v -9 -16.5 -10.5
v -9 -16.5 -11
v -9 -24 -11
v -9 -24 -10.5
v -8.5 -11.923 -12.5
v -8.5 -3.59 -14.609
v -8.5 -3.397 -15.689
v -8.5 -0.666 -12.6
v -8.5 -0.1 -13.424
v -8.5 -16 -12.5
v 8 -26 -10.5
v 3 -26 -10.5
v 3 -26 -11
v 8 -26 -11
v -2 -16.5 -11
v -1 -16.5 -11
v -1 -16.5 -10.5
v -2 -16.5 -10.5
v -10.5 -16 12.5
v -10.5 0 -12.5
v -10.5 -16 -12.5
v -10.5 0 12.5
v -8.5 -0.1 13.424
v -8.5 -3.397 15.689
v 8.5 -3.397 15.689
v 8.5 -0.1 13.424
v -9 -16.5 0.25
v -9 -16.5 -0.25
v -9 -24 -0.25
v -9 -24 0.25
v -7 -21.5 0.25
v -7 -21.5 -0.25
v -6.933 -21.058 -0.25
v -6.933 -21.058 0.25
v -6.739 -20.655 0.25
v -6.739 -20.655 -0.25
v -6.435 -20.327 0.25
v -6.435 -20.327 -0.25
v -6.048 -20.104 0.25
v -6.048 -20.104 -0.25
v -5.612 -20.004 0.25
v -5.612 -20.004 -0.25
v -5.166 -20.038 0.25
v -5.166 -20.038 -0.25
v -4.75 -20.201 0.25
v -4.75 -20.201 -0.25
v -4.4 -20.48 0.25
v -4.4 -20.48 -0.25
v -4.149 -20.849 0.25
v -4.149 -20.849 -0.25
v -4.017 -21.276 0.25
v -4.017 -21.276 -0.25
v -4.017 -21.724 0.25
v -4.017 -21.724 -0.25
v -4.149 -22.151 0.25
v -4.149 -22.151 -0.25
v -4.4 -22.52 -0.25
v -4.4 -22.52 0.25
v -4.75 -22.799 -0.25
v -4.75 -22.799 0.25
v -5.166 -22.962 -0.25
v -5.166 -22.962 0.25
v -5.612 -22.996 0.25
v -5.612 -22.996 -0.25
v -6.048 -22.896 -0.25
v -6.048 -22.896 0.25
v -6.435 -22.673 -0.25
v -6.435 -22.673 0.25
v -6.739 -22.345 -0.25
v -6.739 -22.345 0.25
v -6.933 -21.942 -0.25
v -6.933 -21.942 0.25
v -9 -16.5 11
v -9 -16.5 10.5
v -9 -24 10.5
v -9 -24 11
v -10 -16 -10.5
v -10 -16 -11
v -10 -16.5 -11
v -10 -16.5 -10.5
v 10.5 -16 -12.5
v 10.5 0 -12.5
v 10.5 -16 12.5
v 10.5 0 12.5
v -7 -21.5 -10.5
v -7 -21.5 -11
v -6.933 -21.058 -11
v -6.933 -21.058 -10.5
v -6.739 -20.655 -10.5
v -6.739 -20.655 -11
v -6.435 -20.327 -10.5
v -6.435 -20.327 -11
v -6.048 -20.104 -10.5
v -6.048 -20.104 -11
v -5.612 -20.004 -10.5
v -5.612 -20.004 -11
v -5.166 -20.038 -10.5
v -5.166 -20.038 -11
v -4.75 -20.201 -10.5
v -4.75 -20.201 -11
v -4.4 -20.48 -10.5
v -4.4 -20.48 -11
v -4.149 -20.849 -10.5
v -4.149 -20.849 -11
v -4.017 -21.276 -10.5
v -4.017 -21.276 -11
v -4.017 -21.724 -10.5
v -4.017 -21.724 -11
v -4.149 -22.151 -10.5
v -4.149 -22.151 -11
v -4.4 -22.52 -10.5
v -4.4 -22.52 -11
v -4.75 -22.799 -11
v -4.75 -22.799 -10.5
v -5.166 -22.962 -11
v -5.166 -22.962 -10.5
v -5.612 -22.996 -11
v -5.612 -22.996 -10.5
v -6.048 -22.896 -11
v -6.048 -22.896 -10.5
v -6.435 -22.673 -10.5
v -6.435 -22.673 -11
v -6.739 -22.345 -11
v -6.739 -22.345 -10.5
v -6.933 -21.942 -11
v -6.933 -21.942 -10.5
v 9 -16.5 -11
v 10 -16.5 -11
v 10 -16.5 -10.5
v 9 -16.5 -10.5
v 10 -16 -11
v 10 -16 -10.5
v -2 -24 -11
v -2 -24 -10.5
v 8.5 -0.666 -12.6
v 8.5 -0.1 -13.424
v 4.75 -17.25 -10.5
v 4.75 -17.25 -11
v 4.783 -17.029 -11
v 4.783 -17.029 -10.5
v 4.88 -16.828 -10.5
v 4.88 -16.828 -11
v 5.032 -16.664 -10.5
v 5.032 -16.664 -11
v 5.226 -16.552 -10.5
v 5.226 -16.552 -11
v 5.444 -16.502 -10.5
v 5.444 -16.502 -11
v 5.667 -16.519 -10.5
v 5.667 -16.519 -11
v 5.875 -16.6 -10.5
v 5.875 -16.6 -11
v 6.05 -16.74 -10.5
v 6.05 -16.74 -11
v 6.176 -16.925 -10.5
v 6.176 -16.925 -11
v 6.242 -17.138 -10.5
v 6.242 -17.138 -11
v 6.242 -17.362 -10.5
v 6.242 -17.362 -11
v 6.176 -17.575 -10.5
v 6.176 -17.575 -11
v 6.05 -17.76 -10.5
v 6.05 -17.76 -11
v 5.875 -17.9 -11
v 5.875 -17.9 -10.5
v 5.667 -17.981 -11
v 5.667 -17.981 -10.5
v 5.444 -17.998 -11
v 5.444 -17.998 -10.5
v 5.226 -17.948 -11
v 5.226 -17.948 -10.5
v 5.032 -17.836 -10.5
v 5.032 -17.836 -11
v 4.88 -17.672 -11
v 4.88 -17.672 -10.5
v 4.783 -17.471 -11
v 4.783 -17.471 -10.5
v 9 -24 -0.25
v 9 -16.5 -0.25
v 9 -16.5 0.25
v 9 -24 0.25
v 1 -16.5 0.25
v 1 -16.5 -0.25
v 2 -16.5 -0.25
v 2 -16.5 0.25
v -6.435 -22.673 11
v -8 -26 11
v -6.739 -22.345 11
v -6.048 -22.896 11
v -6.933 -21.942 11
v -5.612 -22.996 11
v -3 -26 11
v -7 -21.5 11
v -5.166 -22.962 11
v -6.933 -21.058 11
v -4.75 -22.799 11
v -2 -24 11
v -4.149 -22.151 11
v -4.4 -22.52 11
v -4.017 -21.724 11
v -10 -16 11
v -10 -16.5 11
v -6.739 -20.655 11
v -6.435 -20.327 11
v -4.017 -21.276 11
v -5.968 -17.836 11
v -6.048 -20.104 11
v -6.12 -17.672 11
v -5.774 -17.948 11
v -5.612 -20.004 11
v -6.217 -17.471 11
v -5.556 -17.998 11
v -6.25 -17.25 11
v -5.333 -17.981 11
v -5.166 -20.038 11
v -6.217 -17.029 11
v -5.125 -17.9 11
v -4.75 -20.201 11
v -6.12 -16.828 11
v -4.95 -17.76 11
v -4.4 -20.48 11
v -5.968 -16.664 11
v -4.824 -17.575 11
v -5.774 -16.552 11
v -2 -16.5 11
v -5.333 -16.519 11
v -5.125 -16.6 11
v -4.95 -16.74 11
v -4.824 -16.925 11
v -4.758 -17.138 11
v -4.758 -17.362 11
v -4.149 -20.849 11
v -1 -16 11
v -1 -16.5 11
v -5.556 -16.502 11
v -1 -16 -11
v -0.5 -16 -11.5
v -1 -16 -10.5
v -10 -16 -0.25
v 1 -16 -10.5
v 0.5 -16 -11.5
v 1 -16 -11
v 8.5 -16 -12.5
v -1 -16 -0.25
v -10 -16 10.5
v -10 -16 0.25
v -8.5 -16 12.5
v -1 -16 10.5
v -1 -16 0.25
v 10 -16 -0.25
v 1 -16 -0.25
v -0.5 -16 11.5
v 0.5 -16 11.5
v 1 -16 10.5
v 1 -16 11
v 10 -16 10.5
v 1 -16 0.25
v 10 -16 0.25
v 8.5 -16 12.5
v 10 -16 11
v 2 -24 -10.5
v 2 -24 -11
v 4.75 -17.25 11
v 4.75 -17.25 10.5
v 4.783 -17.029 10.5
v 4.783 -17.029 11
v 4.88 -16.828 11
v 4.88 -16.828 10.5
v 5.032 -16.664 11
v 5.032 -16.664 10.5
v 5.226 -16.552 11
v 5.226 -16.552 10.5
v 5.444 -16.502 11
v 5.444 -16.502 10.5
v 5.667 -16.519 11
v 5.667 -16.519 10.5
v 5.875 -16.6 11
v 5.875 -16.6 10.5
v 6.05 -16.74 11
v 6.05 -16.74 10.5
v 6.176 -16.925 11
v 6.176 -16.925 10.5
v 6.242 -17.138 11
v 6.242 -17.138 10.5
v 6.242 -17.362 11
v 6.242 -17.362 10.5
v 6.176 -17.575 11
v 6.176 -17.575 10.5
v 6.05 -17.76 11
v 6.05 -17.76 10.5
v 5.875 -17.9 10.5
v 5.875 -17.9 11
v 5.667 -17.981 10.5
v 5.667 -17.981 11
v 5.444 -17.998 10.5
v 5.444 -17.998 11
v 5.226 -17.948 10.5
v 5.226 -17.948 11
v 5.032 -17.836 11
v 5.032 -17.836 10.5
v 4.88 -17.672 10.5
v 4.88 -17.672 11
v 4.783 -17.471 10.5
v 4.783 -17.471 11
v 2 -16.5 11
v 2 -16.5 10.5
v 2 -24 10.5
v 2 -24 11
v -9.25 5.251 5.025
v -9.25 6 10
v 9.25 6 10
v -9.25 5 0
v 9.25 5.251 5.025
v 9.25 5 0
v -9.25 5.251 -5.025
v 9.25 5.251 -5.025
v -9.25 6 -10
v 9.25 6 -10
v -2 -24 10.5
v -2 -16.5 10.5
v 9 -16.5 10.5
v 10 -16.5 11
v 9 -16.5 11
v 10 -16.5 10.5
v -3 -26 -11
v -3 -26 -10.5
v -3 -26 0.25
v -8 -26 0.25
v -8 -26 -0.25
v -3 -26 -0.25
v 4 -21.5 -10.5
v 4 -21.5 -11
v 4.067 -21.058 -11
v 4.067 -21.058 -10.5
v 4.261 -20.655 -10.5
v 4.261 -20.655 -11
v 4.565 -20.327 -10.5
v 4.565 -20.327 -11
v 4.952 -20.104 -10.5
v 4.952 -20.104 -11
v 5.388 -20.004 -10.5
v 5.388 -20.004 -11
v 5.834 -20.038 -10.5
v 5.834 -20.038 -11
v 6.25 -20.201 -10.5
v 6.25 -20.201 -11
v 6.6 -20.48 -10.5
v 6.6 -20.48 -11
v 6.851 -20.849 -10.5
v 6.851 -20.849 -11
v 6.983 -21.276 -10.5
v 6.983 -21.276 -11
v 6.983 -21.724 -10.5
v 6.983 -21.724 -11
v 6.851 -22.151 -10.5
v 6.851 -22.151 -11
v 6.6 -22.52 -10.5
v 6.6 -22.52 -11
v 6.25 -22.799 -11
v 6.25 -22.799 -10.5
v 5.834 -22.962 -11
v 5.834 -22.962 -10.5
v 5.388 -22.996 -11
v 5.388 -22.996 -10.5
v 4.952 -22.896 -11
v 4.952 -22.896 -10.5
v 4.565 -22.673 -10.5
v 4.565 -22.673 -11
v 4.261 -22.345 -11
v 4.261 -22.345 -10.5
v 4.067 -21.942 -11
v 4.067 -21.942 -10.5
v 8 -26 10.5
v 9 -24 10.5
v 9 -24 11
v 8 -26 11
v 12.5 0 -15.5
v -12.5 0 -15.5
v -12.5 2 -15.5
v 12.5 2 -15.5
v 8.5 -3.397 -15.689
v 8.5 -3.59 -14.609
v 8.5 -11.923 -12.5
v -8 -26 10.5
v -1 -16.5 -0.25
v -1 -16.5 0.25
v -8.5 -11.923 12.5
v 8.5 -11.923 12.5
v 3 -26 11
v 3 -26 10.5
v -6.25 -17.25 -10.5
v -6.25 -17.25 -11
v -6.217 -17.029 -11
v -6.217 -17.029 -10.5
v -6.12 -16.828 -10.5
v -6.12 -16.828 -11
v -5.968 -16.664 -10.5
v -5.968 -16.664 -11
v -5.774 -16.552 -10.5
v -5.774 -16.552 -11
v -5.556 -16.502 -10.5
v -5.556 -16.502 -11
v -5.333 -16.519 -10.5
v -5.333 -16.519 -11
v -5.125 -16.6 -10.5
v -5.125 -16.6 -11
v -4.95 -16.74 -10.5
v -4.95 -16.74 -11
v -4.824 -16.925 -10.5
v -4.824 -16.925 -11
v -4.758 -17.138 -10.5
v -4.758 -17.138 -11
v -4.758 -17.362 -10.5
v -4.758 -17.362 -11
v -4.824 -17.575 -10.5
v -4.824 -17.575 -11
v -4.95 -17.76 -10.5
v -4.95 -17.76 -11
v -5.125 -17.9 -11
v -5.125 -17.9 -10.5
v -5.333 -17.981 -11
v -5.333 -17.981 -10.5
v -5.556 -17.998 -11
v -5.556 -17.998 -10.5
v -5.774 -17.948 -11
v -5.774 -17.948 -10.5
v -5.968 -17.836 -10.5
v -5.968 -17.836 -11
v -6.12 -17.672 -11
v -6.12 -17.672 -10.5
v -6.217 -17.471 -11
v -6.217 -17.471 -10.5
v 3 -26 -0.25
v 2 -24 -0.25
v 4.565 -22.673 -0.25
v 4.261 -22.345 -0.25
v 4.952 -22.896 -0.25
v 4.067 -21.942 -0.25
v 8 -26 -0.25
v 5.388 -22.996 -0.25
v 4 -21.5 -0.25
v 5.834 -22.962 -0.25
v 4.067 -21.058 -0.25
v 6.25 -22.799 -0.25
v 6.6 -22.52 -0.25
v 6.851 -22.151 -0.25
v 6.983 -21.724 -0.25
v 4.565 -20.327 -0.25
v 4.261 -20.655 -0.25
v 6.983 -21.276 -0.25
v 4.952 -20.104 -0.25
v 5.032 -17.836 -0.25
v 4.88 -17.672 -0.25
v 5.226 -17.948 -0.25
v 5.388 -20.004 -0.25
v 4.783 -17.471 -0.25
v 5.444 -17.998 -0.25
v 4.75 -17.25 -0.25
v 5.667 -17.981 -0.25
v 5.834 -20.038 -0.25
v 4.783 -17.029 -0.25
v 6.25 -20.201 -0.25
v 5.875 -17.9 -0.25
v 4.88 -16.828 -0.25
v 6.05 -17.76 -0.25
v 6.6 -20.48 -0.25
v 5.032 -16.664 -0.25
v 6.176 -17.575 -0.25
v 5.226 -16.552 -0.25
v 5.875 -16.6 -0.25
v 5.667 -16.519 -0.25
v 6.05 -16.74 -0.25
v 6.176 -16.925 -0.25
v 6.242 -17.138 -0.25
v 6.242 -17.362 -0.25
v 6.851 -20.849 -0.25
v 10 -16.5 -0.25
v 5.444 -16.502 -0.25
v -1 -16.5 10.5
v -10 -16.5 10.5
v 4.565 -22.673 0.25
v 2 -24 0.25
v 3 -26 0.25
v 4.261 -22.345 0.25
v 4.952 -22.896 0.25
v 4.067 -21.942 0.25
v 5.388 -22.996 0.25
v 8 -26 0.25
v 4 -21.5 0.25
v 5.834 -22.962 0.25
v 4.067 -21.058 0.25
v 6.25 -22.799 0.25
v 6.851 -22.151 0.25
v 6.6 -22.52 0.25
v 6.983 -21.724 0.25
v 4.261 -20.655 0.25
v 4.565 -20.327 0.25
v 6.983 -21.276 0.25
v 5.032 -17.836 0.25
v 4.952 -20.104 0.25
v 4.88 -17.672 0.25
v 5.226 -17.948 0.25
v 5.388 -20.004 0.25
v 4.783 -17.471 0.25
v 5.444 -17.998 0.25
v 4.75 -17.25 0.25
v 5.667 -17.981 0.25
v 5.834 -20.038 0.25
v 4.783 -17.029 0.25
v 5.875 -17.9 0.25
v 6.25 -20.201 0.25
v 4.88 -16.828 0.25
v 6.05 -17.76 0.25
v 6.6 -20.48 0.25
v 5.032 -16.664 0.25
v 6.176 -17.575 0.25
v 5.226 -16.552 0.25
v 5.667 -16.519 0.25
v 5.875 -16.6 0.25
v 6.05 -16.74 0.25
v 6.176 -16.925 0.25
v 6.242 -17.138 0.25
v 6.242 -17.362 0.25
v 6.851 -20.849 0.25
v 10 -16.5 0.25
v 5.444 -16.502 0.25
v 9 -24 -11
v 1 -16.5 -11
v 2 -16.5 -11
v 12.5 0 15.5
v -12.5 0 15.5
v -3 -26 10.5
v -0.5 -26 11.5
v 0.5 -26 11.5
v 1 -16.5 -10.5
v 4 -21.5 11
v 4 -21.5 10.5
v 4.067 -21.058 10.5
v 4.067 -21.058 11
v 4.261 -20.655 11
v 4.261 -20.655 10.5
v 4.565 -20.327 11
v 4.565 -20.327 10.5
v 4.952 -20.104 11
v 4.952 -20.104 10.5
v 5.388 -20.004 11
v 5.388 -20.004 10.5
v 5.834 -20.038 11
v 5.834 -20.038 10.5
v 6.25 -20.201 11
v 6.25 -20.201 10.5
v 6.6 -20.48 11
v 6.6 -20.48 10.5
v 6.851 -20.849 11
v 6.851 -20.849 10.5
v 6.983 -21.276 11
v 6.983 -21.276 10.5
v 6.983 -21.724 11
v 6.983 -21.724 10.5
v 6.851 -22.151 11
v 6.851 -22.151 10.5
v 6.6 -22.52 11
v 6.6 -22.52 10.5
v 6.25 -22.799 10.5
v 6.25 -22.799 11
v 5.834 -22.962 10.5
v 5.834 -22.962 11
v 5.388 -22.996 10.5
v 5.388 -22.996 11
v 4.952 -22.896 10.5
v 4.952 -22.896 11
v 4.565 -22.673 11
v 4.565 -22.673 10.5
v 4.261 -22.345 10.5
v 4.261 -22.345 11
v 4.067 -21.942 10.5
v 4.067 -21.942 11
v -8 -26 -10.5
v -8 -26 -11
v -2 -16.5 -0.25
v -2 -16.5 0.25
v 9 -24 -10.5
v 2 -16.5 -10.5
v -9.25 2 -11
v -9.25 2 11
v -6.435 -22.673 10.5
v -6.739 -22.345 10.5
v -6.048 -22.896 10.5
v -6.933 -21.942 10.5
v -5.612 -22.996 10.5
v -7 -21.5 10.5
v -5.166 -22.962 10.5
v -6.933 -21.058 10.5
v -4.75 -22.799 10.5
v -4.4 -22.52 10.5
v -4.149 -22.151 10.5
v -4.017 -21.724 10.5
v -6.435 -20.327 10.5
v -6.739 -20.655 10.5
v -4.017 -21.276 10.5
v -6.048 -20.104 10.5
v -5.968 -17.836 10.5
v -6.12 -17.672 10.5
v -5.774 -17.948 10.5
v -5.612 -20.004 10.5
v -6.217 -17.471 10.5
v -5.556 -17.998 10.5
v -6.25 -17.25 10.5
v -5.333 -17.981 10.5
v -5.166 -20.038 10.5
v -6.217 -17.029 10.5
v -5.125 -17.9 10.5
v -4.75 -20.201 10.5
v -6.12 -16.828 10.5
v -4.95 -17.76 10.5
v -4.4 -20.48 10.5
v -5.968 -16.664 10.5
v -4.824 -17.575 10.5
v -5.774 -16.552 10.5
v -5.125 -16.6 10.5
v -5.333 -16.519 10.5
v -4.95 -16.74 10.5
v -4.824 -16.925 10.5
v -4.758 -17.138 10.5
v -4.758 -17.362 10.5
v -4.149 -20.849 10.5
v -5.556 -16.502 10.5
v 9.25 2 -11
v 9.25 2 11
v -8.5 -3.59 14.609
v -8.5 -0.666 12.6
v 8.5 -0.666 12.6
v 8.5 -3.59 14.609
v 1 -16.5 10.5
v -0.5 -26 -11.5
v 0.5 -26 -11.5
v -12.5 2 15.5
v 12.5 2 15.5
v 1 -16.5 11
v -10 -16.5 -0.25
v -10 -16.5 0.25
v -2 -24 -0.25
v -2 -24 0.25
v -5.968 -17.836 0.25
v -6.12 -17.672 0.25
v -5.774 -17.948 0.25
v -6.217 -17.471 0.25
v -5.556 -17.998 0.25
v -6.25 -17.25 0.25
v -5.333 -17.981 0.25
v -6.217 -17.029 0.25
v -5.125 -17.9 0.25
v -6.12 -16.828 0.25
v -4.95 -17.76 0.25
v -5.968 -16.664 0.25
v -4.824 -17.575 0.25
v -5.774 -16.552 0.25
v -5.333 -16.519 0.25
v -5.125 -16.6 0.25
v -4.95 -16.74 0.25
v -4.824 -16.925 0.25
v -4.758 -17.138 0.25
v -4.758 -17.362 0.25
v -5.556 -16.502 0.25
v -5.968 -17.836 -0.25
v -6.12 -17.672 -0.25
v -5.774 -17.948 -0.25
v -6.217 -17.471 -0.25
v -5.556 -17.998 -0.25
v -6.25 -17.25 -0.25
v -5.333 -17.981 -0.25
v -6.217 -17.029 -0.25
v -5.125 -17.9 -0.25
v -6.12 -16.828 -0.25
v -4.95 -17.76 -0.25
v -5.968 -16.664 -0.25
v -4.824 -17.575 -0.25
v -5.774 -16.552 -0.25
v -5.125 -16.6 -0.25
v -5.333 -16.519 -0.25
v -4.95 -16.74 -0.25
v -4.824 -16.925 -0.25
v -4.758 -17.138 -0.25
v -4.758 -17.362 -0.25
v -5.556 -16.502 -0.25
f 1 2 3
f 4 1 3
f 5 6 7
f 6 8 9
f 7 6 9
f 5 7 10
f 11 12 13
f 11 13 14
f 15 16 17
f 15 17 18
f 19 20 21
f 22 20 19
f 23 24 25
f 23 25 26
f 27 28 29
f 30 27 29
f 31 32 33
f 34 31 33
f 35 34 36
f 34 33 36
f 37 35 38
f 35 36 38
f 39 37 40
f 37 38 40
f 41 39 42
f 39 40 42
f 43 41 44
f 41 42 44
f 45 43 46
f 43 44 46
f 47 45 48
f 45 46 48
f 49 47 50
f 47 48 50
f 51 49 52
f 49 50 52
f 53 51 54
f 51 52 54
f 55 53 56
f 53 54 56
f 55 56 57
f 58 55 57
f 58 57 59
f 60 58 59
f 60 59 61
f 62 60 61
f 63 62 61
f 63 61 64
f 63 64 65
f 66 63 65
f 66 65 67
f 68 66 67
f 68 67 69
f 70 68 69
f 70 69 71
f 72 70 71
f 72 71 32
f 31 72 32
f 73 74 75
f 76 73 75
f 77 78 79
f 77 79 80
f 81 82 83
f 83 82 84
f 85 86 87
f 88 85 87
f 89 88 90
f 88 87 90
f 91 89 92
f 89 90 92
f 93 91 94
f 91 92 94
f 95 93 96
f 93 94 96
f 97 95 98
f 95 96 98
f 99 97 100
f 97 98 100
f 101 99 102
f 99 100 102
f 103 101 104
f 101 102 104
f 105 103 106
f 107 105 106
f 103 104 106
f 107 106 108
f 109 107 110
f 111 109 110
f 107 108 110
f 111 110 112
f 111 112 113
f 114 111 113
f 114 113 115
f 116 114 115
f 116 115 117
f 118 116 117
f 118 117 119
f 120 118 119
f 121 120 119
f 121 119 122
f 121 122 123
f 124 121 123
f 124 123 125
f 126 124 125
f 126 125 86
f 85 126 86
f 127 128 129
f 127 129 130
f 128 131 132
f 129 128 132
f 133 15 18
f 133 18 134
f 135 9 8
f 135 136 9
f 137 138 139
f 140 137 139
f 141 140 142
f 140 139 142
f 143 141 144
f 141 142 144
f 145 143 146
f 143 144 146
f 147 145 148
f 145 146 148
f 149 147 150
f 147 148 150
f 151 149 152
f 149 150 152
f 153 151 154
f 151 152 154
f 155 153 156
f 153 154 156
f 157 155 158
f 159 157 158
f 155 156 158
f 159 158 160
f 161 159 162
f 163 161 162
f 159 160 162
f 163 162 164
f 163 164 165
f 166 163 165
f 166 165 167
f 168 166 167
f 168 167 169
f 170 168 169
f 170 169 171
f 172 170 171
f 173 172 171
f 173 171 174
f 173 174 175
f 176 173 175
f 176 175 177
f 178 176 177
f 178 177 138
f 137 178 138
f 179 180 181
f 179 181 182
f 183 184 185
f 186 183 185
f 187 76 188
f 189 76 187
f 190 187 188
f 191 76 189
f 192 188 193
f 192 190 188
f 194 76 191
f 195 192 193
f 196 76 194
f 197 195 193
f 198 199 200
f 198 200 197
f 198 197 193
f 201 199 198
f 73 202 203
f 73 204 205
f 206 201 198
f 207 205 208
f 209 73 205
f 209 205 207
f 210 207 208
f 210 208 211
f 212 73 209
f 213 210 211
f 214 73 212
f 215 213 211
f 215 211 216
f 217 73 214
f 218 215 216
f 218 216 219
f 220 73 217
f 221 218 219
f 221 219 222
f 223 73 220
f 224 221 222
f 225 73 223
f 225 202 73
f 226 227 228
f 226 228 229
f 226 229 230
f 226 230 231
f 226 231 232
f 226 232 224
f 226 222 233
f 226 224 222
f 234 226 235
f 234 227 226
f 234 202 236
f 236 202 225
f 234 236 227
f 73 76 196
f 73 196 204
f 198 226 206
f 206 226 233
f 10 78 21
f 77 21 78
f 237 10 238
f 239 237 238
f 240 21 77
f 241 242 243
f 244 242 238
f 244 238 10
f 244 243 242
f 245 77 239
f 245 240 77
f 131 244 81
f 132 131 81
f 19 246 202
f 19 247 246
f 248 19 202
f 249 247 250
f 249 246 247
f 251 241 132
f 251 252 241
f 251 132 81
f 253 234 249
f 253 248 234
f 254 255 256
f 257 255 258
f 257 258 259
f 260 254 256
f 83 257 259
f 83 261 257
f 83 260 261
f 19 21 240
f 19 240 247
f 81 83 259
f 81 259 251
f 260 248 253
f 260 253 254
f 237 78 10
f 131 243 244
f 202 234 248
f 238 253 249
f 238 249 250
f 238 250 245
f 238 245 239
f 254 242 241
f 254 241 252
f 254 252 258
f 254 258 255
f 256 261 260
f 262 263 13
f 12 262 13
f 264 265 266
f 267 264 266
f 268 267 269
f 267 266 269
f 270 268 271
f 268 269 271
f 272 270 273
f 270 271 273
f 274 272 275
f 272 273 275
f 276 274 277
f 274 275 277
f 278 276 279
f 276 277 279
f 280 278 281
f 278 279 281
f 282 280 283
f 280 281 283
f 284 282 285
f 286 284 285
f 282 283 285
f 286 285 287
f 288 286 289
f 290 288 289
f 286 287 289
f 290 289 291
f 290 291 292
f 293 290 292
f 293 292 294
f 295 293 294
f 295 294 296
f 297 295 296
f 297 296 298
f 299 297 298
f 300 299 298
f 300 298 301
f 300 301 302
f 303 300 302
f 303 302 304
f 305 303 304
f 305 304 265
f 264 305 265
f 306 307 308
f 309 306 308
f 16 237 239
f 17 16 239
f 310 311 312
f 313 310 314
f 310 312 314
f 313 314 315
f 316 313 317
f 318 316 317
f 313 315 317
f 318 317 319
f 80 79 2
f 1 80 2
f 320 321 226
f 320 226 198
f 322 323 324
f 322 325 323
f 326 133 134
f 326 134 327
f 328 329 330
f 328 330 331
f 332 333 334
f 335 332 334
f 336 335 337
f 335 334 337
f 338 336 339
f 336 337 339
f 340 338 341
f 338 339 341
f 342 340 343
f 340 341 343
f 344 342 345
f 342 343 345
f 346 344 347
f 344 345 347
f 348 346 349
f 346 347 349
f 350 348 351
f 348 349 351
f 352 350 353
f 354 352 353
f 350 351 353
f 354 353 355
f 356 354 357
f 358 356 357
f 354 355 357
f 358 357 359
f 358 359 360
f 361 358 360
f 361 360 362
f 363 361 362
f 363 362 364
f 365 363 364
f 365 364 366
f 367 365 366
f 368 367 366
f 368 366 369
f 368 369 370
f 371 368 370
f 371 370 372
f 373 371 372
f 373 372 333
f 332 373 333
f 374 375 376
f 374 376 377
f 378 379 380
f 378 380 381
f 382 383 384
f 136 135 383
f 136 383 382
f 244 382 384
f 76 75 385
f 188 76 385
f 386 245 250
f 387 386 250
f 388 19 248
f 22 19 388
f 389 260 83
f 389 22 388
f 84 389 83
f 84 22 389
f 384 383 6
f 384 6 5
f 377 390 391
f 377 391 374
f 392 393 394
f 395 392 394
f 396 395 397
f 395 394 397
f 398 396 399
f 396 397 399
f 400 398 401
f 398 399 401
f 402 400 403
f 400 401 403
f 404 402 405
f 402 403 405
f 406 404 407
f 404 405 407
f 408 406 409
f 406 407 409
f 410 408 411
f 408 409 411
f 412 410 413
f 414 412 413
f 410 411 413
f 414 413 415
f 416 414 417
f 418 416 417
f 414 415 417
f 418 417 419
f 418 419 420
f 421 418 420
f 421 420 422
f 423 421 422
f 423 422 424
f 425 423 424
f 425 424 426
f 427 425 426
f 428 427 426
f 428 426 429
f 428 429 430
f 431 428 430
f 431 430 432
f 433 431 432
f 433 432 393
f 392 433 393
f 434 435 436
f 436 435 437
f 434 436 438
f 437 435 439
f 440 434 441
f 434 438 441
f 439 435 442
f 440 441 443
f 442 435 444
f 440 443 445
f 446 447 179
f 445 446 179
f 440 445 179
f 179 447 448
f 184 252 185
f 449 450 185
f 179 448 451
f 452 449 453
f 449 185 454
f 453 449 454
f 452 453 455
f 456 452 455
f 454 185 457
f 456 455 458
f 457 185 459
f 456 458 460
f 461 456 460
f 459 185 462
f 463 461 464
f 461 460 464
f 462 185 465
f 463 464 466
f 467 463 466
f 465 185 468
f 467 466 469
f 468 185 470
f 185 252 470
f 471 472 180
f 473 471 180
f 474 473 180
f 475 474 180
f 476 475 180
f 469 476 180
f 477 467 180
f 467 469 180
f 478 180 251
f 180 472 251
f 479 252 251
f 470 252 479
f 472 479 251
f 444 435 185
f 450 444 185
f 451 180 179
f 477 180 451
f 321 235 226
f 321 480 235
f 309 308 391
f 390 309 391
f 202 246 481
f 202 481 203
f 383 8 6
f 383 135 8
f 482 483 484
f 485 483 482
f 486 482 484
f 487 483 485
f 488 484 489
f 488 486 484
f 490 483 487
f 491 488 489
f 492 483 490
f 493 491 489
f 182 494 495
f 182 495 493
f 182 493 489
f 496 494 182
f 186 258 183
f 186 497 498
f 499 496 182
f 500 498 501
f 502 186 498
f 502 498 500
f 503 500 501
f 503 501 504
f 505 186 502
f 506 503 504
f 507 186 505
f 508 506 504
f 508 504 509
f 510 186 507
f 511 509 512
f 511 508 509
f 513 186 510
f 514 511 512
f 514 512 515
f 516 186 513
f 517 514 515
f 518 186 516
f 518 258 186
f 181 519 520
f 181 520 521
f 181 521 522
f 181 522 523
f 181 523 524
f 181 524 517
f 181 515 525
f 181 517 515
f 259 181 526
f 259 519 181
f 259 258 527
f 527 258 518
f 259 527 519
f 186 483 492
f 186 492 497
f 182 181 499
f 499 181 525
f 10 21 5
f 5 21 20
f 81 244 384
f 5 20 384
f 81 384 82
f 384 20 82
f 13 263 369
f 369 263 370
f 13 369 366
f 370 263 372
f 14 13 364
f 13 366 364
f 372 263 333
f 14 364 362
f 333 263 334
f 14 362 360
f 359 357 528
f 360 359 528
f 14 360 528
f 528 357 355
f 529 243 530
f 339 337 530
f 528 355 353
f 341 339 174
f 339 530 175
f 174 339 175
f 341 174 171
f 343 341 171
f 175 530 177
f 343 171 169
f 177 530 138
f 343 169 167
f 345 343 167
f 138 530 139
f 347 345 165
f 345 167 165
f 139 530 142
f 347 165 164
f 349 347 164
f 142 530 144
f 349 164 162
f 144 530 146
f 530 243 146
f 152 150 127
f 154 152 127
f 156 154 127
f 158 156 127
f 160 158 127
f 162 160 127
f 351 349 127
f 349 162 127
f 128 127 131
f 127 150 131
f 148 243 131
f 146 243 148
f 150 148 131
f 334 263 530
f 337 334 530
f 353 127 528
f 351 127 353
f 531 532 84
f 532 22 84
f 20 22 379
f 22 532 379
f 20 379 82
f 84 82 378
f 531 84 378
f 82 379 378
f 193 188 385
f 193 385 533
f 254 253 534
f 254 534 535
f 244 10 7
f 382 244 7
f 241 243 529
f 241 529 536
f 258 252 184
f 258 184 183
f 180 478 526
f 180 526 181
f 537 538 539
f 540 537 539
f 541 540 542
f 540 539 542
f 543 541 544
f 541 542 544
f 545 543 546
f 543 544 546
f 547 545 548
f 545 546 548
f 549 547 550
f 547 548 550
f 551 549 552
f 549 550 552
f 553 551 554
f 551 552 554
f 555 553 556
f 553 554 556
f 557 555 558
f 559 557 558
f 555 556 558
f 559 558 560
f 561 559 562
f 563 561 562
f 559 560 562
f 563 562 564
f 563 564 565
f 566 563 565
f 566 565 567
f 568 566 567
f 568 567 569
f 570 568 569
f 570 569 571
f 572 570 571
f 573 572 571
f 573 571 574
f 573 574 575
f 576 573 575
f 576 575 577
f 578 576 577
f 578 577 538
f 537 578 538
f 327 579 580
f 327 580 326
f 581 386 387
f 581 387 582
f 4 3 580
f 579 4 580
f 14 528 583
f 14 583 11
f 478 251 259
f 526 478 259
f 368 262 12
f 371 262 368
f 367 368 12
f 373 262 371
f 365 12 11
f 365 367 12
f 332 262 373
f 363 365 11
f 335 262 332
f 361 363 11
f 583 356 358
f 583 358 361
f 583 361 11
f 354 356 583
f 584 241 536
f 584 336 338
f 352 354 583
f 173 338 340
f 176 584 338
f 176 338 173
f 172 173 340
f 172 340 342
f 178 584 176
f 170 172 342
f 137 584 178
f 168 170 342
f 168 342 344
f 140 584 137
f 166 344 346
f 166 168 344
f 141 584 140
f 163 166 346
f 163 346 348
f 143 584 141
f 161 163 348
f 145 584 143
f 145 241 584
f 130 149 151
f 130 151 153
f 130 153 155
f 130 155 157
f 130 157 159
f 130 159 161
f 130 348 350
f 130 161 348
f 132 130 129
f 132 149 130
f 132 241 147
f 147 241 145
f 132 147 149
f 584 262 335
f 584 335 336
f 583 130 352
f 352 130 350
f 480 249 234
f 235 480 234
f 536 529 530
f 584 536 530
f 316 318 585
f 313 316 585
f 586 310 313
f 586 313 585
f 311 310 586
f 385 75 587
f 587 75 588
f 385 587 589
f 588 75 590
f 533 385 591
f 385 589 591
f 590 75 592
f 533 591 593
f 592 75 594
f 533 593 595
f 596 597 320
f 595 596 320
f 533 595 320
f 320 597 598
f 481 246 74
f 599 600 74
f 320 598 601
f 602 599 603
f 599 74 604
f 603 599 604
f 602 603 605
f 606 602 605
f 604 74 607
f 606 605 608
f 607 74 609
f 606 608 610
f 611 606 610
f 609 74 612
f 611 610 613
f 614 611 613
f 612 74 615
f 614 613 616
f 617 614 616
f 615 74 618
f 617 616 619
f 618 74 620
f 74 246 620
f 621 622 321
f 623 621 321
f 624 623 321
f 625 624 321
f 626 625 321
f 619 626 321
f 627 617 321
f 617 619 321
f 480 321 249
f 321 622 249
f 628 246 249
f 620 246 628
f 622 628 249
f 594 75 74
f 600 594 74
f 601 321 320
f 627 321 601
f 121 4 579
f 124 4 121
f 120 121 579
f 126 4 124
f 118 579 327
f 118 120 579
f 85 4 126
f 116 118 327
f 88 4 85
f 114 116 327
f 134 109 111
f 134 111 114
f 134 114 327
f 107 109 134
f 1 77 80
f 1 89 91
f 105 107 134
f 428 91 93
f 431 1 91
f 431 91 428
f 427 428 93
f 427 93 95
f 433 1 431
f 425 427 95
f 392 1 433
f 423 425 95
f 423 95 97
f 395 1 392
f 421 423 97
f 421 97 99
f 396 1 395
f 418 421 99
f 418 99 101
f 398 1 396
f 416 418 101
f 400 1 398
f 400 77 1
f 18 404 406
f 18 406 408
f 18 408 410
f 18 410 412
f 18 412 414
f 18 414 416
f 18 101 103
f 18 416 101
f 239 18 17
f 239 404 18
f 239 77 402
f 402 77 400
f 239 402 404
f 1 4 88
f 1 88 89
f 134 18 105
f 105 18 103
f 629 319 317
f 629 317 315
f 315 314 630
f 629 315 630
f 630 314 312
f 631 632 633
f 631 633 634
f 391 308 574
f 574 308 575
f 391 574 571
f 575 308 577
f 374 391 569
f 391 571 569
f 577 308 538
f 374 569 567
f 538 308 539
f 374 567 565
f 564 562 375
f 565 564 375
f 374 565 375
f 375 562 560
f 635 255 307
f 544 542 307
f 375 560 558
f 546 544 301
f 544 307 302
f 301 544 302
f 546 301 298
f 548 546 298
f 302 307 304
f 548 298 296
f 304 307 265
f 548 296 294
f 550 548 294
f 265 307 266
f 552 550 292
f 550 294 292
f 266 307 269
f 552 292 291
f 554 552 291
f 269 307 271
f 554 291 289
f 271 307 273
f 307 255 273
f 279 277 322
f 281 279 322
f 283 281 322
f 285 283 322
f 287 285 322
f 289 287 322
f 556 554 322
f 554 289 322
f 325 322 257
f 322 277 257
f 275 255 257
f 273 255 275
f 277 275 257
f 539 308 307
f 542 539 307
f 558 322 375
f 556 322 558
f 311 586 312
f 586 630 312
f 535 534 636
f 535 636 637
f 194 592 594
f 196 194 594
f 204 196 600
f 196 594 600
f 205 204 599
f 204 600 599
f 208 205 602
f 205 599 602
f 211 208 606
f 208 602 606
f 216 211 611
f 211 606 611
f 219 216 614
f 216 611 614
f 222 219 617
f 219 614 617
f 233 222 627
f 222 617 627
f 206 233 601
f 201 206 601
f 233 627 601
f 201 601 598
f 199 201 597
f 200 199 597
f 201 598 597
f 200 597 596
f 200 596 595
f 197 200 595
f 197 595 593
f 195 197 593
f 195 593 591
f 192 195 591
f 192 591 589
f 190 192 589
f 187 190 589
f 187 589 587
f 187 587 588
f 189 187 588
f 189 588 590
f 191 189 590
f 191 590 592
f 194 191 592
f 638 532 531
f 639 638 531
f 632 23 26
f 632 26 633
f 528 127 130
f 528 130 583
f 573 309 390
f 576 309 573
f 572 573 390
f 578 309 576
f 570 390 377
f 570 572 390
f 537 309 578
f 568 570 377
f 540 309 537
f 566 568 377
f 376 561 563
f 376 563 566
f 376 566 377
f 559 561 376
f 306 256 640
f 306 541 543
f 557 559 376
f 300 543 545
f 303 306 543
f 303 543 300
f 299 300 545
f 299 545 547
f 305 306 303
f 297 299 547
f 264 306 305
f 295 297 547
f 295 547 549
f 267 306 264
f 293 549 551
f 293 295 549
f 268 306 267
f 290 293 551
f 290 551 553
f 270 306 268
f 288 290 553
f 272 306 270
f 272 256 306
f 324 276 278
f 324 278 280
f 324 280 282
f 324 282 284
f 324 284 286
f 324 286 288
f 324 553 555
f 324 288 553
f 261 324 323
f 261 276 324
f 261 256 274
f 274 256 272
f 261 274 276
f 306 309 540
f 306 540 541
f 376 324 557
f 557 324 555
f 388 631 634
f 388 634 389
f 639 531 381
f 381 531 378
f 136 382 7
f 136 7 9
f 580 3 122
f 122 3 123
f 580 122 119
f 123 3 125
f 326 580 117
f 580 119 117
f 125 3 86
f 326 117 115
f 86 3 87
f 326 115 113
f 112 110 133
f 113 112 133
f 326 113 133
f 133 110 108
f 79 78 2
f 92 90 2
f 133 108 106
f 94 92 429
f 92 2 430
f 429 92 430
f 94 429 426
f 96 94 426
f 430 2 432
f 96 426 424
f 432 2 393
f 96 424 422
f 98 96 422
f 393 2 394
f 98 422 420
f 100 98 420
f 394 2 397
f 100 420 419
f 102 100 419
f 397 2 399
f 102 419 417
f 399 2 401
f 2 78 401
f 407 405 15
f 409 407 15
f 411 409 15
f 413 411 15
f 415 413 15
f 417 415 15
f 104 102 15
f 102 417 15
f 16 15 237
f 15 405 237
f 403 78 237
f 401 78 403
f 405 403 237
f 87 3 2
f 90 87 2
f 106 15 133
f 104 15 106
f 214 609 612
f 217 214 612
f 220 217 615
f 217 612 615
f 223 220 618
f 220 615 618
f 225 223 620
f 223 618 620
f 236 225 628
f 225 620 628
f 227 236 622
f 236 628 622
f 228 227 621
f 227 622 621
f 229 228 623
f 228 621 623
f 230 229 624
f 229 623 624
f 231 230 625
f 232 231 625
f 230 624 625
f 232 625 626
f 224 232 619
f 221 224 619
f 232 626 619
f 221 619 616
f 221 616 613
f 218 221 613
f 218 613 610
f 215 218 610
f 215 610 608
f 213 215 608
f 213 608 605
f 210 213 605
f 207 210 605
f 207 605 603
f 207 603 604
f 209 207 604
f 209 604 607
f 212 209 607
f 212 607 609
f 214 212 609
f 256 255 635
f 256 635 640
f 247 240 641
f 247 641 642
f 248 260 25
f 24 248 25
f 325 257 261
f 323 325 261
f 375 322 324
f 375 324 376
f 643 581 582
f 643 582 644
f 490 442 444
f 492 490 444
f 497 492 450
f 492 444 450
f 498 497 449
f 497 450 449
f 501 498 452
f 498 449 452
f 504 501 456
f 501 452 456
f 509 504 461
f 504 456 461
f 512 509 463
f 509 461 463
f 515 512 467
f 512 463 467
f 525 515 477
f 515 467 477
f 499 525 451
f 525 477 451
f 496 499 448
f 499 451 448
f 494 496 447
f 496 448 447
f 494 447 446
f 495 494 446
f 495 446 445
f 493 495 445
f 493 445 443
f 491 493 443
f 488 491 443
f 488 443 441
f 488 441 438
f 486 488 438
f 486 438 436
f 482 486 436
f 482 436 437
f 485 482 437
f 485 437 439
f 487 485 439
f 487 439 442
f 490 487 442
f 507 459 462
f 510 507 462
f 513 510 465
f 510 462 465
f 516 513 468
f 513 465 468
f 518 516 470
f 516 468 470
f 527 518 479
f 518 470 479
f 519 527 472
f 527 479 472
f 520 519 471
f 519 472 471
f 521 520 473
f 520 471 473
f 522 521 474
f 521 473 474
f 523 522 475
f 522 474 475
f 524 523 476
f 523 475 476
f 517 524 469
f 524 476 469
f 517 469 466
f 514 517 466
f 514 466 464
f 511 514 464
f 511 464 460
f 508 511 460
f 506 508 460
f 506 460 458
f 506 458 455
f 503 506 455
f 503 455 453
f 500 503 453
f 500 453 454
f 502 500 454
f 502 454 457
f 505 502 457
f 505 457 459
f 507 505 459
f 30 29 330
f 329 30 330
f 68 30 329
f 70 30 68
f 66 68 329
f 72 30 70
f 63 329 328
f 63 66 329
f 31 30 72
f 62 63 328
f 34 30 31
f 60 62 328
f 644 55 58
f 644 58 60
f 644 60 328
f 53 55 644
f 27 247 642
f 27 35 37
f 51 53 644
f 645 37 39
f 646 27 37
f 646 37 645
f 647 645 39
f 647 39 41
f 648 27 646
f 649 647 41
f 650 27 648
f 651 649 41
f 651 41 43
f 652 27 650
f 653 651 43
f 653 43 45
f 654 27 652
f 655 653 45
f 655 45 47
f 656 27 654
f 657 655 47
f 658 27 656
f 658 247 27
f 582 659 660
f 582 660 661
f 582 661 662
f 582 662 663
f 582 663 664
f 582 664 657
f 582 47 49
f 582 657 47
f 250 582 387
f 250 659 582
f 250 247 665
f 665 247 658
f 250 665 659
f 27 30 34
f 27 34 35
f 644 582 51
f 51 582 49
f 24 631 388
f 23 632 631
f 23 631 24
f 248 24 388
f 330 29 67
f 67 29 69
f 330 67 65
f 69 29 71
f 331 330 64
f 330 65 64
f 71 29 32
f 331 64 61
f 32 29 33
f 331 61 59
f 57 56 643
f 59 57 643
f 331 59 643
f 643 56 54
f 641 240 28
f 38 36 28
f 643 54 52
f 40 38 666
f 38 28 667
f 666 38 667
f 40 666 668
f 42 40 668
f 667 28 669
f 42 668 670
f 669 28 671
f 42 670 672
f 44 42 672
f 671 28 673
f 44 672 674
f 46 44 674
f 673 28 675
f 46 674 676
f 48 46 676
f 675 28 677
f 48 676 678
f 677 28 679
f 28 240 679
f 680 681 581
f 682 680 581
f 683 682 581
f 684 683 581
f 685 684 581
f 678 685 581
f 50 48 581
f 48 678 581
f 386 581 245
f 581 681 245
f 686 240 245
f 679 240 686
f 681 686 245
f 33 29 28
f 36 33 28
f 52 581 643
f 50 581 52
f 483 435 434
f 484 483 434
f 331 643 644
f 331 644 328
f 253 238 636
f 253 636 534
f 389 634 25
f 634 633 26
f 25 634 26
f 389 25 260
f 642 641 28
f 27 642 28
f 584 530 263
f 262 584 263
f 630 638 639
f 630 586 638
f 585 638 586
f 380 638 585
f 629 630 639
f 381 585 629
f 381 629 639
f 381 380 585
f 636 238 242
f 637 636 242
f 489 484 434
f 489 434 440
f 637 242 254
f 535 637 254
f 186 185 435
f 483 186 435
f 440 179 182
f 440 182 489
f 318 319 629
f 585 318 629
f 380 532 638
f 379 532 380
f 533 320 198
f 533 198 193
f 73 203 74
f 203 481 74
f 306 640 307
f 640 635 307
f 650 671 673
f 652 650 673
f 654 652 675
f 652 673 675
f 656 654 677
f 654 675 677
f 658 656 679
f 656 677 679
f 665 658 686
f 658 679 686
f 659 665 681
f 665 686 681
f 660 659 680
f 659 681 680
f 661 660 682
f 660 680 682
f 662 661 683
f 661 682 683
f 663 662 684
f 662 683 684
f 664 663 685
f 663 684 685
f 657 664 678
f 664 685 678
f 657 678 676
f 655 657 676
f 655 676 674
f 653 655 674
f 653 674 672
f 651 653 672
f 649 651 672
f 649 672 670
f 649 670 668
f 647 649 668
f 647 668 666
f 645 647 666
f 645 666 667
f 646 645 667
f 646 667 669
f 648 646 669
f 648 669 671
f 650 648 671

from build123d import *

# Parameters (mm, degrees)
SKETCH_1_W          = 25
SKETCH_1_H          = 31
EXTRUDE_1_DEPTH     = 2
SKETCH_2_W          = 21
SKETCH_2_H          = 25
EXTRUDE_2_DEPTH     = 16
EXTRUDE_3_DEPTH     = 9.25
EXTRUDE_5_DEPTH     = 8.5
SKETCH_5_W          = 1
SKETCH_5_H          = 23
SKETCH_5_W_2        = 9
SKETCH_5_H_2        = 0.5
EXTRUDE_6_DEPTH     = 10
SKETCH_6_R          = 1.5
SKETCH_6_R_2        = 0.75
CUT_EXTRUDE_1_DEPTH = 27.688922773


with BuildPart() as part:
    # Эскиз1 → Бобышка-Вытянуть1 (new body)
    with BuildSketch(Plane(origin=(0, 0, 0), x_dir=(1, 0, 0), z_dir=(0, 1, 0))):
        Rectangle(SKETCH_1_W, SKETCH_1_H)
    extrude(amount=EXTRUDE_1_DEPTH)

    # Эскиз2 → Бобышка-Вытянуть2 (add)
    with BuildSketch(Plane.XZ):
        Rectangle(SKETCH_2_W, SKETCH_2_H)
    extrude(amount=EXTRUDE_2_DEPTH)

    # Эскиз3 → Бобышка-Вытянуть3 (add, symmetric)
    with BuildSketch(Plane(origin=(0, 0, 0), x_dir=(0, 0, -1), z_dir=(1, 0, 0))):
        with BuildLine():
            Line((11, 2), (-11, 2))
            Line((-11, 2), (-10, 6))
            ThreePointArc((-10, 6), (0, 5), (10, 6))
            Line((10, 6), (11, 2))
        make_face()
    extrude(amount=EXTRUDE_3_DEPTH, both=True)

    # Эскиз4 → Бобышка-Вытянуть5 (add, symmetric)
    with BuildSketch(Plane(origin=(0, 0, 0), x_dir=(0, 0, -1), z_dir=(1, 0, 0))):
        Polygon((-12.5, -16), (-15.688922773, -3.397191918), (-13.42429798, -0.1), (-12.6, -0.666156198), (-14.608505885, -3.590450497), (-11.530553224, -15.754698248), align=None)
        Polygon((14.608505885, -3.590450497), (11.530553224, -15.754698248), (12.5, -16), (15.688922773, -3.397191918), (13.42429798, -0.1), (12.6, -0.666156198), align=None)
    extrude(amount=EXTRUDE_5_DEPTH, both=True)

    # Эскиз5 → Бобышка-Вытянуть6 (add)
    with BuildSketch(Plane.XZ.offset(16)):
        Rectangle(SKETCH_5_W, SKETCH_5_H)
        with Locations((5.5, -10.75)):
            Rectangle(SKETCH_5_W_2, SKETCH_5_H_2)
        with Locations((5.5, 10.75)):
            Rectangle(SKETCH_5_W_2, SKETCH_5_H_2)
        with Locations((5.5, 0)):
            Rectangle(SKETCH_5_W_2, SKETCH_5_H_2)
        with Locations((-5.5, -10.75)):
            Rectangle(SKETCH_5_W_2, SKETCH_5_H_2)
        with Locations((-5.5, 0)):
            Rectangle(SKETCH_5_W_2, SKETCH_5_H_2)
        with Locations((-5.5, 10.75)):
            Rectangle(SKETCH_5_W_2, SKETCH_5_H_2)
    extrude(amount=EXTRUDE_6_DEPTH)

    # Эскиз6 → Вырез-Вытянуть1 (cut, through all)
    with BuildSketch(Plane(origin=(0, 0, -11), x_dir=(-1, 0, 0), z_dir=(0, 0, -1))):
        with Locations((-5.5, -21.5)):
            Circle(SKETCH_6_R)
        with Locations((-5.5, -17.25)):
            Circle(SKETCH_6_R_2)
        with Locations((5.5, -17.25)):
            Circle(SKETCH_6_R_2)
        with Locations((5.5, -21.5)):
            Circle(SKETCH_6_R)
        Polygon((-10.25, -16.5), (-9, -16.5), (-9, -24), (-8, -26), (-8, -27.807511946), (-10.25, -27.807511946), align=None)
        Polygon((-3, -27.807511946), (-0.75, -27.807511946), (-0.75, -16.5), (-2, -16.5), (-2, -24), (-3, -26), align=None)
        Polygon((3, -26), (3, -27.807511946), (0.75, -27.807511946), (0.75, -16.5), (2, -16.5), (2, -24), align=None)
        Polygon((8, -27.807511946), (10.25, -27.807511946), (10.25, -16.5), (9, -16.5), (9, -24), (8, -26), align=None)
    extrude(amount=-CUT_EXTRUDE_1_DEPTH, mode=Mode.SUBTRACT)


solid = part.part
